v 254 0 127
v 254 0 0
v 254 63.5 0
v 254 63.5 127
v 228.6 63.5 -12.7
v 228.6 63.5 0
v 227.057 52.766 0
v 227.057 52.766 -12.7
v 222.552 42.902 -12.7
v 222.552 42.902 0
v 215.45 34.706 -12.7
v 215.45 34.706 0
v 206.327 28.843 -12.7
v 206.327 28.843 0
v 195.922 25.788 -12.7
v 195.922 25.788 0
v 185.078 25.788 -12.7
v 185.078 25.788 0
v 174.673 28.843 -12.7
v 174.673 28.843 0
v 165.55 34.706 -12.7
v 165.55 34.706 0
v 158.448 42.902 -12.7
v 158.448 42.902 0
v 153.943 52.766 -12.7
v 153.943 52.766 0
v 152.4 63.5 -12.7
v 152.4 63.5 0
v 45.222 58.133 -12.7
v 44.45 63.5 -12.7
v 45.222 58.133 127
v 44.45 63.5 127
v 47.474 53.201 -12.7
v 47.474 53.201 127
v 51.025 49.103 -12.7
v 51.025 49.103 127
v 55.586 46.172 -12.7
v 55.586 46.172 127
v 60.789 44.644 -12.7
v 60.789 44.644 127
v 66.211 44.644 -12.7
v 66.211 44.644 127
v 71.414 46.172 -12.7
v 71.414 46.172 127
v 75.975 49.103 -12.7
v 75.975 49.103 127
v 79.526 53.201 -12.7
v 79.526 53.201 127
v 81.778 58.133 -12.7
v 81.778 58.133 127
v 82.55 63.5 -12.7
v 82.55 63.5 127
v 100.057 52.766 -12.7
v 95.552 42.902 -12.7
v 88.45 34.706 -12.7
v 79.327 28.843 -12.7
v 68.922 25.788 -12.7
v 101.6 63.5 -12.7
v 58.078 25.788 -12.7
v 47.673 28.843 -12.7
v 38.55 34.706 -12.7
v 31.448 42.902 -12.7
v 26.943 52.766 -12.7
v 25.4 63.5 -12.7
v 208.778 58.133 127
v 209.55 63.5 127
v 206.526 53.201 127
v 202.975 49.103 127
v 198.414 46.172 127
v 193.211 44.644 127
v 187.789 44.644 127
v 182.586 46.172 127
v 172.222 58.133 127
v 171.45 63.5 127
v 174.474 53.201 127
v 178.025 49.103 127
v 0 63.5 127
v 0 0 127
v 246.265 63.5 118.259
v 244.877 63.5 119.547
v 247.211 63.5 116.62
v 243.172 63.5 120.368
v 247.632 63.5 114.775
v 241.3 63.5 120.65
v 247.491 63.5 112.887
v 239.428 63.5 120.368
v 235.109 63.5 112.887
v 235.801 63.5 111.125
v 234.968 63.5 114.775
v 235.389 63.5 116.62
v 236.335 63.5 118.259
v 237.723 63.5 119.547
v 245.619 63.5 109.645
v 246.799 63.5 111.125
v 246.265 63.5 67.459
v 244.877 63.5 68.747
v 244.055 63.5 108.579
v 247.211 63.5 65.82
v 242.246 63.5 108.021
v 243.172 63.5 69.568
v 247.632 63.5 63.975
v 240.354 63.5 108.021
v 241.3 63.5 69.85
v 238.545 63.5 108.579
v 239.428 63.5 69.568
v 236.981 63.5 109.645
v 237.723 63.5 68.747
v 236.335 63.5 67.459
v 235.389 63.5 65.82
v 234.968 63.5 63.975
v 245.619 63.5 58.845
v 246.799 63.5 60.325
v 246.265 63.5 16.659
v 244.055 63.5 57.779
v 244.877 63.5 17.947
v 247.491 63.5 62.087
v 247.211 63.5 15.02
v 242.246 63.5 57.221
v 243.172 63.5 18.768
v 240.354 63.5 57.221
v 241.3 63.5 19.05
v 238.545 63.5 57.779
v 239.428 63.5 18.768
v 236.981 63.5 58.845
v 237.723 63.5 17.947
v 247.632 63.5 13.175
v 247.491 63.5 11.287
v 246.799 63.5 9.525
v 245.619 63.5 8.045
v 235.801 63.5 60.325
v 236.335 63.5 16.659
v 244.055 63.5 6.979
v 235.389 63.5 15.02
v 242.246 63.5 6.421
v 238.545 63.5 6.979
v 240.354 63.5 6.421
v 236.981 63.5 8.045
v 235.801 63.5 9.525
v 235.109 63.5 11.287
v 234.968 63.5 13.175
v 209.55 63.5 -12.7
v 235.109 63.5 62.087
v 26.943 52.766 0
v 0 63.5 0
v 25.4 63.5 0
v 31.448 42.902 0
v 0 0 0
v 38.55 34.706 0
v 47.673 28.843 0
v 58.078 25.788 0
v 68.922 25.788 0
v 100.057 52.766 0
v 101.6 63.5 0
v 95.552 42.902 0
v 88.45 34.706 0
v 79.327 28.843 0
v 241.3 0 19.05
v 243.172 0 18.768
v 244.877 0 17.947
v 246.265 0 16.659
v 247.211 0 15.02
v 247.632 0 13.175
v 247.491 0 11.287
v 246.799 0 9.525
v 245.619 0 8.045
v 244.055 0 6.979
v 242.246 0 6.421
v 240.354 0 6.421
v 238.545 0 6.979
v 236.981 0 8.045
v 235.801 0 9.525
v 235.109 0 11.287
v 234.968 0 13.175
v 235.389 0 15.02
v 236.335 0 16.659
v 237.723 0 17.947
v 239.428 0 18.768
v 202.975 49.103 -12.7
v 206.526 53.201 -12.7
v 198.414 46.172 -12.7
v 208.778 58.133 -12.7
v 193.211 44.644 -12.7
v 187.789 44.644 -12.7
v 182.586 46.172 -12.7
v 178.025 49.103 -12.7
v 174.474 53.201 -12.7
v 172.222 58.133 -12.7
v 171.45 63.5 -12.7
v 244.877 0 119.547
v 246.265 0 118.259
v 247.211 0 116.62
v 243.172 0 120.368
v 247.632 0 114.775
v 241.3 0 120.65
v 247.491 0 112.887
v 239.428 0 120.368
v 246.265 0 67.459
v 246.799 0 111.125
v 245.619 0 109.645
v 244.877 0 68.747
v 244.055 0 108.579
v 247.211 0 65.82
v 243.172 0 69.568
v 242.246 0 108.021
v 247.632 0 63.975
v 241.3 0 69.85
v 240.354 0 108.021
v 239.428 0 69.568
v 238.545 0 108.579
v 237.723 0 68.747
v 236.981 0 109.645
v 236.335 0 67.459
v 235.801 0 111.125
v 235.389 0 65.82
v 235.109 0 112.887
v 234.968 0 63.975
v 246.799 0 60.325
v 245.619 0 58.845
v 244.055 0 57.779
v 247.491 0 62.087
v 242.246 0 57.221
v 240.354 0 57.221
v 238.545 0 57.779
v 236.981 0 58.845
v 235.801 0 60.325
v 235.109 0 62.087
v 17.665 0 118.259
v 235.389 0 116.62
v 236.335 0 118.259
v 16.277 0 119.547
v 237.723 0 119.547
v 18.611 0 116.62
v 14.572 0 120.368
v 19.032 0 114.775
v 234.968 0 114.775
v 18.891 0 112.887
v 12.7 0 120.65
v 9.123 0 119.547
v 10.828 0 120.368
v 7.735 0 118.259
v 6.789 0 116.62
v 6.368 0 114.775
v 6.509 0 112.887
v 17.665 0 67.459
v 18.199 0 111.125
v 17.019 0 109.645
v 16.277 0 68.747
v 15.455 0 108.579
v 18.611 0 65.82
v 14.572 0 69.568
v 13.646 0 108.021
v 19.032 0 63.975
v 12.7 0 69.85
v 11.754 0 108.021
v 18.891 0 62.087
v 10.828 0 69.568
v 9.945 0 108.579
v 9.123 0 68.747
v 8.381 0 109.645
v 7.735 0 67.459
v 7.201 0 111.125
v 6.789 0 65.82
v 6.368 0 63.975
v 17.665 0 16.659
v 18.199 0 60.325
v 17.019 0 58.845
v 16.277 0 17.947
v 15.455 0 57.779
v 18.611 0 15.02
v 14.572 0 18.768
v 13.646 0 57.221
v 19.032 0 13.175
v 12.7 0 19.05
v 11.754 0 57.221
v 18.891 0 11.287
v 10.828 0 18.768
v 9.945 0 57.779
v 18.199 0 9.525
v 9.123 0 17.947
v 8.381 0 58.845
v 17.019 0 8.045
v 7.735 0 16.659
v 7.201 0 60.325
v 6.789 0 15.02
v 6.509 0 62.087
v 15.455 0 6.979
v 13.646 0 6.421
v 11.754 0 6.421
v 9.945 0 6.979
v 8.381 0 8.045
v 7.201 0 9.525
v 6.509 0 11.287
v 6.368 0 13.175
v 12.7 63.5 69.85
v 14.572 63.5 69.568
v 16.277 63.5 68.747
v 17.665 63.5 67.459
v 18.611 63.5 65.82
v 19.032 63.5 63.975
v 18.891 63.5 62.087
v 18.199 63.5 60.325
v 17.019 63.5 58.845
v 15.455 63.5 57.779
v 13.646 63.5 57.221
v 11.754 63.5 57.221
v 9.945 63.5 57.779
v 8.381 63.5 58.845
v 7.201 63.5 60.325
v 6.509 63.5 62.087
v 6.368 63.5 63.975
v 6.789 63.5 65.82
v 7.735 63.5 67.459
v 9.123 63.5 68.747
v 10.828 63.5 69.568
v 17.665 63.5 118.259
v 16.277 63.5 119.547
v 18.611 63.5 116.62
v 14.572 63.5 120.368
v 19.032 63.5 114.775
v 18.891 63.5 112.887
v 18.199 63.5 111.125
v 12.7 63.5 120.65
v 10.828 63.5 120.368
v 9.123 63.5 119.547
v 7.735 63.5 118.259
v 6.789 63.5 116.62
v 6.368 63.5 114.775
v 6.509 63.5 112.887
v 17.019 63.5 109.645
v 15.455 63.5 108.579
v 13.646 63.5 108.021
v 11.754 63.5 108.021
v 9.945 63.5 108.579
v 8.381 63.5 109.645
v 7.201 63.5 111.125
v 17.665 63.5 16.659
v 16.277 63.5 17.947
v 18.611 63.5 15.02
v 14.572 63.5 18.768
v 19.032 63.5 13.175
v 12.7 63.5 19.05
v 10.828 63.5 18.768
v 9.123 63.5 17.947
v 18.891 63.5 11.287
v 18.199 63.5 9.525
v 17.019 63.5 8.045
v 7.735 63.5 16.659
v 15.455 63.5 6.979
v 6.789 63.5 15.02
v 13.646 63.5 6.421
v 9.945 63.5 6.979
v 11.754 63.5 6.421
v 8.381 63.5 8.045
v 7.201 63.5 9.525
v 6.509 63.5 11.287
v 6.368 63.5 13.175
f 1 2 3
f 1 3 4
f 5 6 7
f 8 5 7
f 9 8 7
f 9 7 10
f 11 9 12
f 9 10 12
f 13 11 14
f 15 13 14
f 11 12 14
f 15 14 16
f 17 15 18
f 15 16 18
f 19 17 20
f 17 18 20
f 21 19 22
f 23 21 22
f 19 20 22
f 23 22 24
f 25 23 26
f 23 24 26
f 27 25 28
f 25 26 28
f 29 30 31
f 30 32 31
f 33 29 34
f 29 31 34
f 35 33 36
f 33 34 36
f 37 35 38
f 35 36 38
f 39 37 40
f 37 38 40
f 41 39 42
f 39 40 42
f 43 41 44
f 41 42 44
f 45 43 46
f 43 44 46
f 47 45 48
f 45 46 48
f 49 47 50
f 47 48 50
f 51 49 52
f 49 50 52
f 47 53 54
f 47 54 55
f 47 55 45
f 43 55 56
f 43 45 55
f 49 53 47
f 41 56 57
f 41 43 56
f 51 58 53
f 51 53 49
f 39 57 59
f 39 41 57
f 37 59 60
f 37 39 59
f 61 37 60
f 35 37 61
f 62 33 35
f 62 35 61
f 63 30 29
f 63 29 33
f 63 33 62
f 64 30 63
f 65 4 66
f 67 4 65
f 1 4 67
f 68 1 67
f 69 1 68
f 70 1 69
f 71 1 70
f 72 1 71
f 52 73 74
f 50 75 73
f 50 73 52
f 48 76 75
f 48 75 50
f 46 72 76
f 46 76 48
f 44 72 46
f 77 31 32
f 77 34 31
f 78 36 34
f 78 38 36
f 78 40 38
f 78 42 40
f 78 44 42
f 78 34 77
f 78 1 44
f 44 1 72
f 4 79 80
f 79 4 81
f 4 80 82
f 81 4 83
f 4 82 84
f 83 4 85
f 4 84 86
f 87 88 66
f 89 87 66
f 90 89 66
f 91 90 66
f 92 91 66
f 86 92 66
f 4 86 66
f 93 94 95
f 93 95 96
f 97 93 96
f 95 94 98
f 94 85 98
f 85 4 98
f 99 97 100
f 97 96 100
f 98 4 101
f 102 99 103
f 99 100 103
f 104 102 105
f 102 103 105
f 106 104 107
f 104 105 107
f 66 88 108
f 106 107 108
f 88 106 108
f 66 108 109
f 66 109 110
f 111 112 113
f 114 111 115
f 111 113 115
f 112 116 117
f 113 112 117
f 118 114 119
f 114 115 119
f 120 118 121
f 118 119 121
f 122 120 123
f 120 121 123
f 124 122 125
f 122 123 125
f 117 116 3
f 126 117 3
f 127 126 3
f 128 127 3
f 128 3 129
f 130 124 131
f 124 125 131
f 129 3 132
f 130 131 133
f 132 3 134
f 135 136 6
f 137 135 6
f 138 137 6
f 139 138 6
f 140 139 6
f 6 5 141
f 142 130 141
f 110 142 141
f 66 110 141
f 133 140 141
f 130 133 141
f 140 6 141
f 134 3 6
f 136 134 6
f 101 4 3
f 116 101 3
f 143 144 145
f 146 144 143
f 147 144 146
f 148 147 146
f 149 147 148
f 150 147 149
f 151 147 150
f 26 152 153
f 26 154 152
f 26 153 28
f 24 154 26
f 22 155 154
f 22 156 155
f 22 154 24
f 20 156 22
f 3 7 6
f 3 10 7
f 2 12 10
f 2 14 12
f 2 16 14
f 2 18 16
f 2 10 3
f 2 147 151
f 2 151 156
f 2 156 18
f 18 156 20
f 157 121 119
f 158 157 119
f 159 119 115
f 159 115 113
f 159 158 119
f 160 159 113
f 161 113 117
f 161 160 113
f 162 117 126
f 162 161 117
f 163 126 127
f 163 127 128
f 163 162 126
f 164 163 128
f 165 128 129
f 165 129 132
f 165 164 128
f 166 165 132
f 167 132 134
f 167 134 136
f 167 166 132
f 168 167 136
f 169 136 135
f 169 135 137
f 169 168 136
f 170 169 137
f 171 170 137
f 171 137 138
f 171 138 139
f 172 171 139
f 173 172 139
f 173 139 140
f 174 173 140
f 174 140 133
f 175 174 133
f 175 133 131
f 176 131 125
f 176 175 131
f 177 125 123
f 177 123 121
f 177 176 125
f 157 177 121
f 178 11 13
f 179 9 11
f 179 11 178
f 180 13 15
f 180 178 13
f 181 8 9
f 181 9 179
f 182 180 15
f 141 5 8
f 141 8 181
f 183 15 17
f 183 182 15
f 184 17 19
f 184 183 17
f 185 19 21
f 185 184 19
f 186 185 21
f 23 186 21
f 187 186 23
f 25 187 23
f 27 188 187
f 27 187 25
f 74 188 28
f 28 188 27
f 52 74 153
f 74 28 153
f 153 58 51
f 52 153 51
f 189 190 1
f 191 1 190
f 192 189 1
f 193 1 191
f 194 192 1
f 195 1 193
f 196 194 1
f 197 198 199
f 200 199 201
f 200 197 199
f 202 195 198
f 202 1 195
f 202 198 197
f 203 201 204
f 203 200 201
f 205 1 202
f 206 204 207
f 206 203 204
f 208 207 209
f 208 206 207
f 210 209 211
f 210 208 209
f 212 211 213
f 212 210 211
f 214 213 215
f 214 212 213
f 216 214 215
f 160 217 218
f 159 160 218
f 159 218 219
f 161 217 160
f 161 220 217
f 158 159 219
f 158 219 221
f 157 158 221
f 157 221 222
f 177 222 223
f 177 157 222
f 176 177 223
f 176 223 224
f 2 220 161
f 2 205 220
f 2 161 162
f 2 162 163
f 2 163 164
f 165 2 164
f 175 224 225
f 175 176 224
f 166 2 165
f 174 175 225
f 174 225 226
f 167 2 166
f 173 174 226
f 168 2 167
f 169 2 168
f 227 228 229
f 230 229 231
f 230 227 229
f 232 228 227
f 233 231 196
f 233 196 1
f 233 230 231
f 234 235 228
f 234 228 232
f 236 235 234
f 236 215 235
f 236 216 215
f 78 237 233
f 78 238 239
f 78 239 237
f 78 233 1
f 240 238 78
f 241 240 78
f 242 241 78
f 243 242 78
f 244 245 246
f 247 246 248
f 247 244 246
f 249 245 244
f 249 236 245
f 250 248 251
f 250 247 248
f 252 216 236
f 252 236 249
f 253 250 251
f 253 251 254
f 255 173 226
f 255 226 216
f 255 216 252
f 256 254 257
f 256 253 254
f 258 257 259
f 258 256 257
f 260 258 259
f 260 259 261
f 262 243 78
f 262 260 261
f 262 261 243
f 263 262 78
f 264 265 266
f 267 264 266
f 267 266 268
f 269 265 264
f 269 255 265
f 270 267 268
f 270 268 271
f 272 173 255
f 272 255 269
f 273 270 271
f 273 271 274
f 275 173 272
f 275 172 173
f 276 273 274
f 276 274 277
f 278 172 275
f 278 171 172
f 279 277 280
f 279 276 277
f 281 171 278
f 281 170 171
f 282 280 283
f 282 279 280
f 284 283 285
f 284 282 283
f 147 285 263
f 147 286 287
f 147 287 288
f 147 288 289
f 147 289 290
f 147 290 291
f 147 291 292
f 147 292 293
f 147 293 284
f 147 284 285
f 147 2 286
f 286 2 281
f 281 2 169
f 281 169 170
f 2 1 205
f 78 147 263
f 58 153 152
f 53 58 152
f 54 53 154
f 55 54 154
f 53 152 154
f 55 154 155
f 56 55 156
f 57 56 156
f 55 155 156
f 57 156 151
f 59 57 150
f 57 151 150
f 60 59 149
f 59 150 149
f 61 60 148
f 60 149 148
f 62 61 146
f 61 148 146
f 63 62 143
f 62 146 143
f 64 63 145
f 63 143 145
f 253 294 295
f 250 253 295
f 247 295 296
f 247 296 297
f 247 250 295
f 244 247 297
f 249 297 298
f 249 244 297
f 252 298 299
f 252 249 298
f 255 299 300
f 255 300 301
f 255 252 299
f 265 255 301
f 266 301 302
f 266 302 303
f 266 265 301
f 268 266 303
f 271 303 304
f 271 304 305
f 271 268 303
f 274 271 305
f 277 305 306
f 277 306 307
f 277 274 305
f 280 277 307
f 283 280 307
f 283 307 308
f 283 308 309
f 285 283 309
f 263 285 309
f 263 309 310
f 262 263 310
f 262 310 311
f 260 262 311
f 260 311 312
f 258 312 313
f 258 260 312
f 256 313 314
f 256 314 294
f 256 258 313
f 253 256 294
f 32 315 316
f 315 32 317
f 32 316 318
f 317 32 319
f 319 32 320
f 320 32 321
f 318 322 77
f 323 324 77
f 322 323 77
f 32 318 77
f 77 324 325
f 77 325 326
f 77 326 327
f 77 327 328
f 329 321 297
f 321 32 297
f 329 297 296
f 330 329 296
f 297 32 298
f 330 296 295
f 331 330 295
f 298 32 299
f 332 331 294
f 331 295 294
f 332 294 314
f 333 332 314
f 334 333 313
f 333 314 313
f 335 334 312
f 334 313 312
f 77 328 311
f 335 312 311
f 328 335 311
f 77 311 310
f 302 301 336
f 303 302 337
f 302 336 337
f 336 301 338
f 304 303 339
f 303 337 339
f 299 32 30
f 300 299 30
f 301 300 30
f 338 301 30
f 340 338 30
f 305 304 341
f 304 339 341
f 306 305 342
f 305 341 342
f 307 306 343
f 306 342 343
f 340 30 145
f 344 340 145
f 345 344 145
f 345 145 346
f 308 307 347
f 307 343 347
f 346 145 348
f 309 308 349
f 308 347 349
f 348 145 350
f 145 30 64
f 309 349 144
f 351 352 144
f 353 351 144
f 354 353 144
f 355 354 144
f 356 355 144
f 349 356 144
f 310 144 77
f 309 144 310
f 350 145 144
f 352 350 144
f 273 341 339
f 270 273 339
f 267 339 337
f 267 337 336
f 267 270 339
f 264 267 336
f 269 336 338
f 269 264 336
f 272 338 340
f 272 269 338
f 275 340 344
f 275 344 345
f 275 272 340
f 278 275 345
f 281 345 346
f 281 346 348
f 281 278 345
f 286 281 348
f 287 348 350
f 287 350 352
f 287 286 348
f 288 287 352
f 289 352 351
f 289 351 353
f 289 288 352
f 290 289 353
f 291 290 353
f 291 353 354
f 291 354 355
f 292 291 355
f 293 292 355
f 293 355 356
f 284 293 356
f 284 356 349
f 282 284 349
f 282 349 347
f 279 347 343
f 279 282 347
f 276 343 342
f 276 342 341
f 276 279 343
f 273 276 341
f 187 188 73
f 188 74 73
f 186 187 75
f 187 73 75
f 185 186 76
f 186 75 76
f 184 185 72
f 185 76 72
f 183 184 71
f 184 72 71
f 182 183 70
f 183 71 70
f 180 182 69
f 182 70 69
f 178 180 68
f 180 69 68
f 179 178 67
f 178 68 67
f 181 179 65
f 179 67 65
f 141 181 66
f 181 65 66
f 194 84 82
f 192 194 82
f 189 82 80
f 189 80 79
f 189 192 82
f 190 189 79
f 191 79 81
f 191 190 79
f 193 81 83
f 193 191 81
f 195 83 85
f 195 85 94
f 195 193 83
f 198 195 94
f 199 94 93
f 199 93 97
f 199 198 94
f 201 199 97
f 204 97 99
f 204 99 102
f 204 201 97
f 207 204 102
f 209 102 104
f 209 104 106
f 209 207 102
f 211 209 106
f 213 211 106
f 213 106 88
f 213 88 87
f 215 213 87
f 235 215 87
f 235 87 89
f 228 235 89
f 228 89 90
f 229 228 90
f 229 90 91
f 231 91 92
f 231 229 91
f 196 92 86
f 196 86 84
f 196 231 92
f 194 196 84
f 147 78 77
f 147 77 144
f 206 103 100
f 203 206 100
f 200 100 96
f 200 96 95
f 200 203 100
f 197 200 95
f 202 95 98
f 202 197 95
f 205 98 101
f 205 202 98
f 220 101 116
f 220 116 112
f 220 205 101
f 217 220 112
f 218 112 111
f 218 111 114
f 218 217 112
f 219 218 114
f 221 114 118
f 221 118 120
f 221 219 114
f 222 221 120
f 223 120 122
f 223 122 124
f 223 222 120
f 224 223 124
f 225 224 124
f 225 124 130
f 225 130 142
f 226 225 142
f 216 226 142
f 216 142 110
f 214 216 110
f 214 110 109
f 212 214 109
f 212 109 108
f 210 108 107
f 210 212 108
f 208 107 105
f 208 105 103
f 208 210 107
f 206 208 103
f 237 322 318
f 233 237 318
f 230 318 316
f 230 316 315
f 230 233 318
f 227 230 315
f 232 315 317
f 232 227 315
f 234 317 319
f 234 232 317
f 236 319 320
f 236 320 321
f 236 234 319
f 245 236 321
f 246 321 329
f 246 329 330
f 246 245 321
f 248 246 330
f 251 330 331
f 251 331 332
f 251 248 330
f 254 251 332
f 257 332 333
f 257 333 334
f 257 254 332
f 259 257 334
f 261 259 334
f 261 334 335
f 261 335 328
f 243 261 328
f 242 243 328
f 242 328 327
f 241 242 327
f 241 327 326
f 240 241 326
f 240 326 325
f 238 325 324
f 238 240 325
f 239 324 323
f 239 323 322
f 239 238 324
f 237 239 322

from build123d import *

# Parameters (mm, degrees)
SKETCH1_R               = 6.35000000000001
SKETCH1_R_2             = 6.349999999999968
SKETCH1_R_3             = 6.350000000000001
SKETCH1_R_4             = 6.350000000000003
SKETCH1_R_5             = 6.3499999999999375
SKETCH1_R_6             = 6.349999999999967
BOSS_EXTRUDE3_DEPTH     = 63.5
BOSS_EXTRUDE9_DEPTH     = 12.7
CUT_EXTRUDE5_DEPTH      = 291.99355662969583
CUT_EXTRUDE5_DEPTH_BACK = 291.99355662969583


with BuildPart() as part:
    # Sketch1 → Boss-Extrude3 (new body)
    with BuildSketch(Plane(origin=(0, 0, 0), x_dir=(1, 0, 0), z_dir=(0, 1, 0))):
        Polygon((254, 0), (0, 0), (1.555e-14, -127), (254, -127), align=None)
        with Locations((12.700000000000053, -114.3)):
            Circle(SKETCH1_R, mode=Mode.SUBTRACT)
        with Locations((241.30000000000004, -114.3)):
            Circle(SKETCH1_R_2, mode=Mode.SUBTRACT)
        with Locations((12.699999999999523, -63.5)):
            Circle(SKETCH1_R_3, mode=Mode.SUBTRACT)
        with Locations((12.69999999999899, -12.700000000000003)):
            Circle(SKETCH1_R_4, mode=Mode.SUBTRACT)
        with Locations((241.29999999999953, -63.5)):
            Circle(SKETCH1_R_5, mode=Mode.SUBTRACT)
        with Locations((241.299999999999, -12.700000000000003)):
            Circle(SKETCH1_R_6, mode=Mode.SUBTRACT)
    extrude(amount=BOSS_EXTRUDE3_DEPTH)

    # Sketch3 → Boss-Extrude9 (add)
    with BuildSketch(Plane(origin=(0, 0, 0), x_dir=(-1, 0, 0), z_dir=(0, 0, -1))):
        with BuildLine():
            Line((-82.55000000000001, 63.5), (-101.6, 63.5))
            ThreePointArc((-101.6, 63.49999999999999), (-63.5, 25.400000000000006), (-25.400000000000006, 63.5))
            Line((-25.400000000000006, 63.5), (-44.44999999999999, 63.5))
            ThreePointArc((-44.44999999999999, 63.5), (-63.5, 44.44999999999999), (-82.55000000000001, 63.5))
        make_face()
        with BuildLine():
            ThreePointArc((-228.6, 63.5), (-190.5, 25.400000000000013), (-152.4, 63.49999999999999))
            Line((-152.4, 63.5), (-171.45, 63.5))
            ThreePointArc((-171.45, 63.5), (-190.5, 44.44999999999999), (-209.55, 63.5))
            Line((-209.55, 63.5), (-228.6, 63.5))
        make_face()
    extrude(amount=BOSS_EXTRUDE9_DEPTH)

    # Sketch3<12> → Cut-Extrude5 (cut, two sides: drawn at the far end of the back side and taken through both)
    with BuildSketch(Plane(origin=(0, 0, 0), x_dir=(-1, 0, 0), z_dir=(0, 0, -1)).offset(-CUT_EXTRUDE5_DEPTH_BACK)):
        with BuildLine():
            Line((-44.44999999999999, 63.5), (-82.55000000000001, 63.5))
            ThreePointArc((-82.55000000000001, 63.5), (-63.5, 44.44999999999999), (-44.44999999999999, 63.5))
        make_face()
        with BuildLine():
            ThreePointArc((-209.55, 63.5), (-190.5, 44.44999999999999), (-171.45, 63.5))
            Line((-171.45, 63.5), (-209.55, 63.5))
        make_face()
    extrude(amount=CUT_EXTRUDE5_DEPTH + CUT_EXTRUDE5_DEPTH_BACK, mode=Mode.SUBTRACT)


solid = part.part
